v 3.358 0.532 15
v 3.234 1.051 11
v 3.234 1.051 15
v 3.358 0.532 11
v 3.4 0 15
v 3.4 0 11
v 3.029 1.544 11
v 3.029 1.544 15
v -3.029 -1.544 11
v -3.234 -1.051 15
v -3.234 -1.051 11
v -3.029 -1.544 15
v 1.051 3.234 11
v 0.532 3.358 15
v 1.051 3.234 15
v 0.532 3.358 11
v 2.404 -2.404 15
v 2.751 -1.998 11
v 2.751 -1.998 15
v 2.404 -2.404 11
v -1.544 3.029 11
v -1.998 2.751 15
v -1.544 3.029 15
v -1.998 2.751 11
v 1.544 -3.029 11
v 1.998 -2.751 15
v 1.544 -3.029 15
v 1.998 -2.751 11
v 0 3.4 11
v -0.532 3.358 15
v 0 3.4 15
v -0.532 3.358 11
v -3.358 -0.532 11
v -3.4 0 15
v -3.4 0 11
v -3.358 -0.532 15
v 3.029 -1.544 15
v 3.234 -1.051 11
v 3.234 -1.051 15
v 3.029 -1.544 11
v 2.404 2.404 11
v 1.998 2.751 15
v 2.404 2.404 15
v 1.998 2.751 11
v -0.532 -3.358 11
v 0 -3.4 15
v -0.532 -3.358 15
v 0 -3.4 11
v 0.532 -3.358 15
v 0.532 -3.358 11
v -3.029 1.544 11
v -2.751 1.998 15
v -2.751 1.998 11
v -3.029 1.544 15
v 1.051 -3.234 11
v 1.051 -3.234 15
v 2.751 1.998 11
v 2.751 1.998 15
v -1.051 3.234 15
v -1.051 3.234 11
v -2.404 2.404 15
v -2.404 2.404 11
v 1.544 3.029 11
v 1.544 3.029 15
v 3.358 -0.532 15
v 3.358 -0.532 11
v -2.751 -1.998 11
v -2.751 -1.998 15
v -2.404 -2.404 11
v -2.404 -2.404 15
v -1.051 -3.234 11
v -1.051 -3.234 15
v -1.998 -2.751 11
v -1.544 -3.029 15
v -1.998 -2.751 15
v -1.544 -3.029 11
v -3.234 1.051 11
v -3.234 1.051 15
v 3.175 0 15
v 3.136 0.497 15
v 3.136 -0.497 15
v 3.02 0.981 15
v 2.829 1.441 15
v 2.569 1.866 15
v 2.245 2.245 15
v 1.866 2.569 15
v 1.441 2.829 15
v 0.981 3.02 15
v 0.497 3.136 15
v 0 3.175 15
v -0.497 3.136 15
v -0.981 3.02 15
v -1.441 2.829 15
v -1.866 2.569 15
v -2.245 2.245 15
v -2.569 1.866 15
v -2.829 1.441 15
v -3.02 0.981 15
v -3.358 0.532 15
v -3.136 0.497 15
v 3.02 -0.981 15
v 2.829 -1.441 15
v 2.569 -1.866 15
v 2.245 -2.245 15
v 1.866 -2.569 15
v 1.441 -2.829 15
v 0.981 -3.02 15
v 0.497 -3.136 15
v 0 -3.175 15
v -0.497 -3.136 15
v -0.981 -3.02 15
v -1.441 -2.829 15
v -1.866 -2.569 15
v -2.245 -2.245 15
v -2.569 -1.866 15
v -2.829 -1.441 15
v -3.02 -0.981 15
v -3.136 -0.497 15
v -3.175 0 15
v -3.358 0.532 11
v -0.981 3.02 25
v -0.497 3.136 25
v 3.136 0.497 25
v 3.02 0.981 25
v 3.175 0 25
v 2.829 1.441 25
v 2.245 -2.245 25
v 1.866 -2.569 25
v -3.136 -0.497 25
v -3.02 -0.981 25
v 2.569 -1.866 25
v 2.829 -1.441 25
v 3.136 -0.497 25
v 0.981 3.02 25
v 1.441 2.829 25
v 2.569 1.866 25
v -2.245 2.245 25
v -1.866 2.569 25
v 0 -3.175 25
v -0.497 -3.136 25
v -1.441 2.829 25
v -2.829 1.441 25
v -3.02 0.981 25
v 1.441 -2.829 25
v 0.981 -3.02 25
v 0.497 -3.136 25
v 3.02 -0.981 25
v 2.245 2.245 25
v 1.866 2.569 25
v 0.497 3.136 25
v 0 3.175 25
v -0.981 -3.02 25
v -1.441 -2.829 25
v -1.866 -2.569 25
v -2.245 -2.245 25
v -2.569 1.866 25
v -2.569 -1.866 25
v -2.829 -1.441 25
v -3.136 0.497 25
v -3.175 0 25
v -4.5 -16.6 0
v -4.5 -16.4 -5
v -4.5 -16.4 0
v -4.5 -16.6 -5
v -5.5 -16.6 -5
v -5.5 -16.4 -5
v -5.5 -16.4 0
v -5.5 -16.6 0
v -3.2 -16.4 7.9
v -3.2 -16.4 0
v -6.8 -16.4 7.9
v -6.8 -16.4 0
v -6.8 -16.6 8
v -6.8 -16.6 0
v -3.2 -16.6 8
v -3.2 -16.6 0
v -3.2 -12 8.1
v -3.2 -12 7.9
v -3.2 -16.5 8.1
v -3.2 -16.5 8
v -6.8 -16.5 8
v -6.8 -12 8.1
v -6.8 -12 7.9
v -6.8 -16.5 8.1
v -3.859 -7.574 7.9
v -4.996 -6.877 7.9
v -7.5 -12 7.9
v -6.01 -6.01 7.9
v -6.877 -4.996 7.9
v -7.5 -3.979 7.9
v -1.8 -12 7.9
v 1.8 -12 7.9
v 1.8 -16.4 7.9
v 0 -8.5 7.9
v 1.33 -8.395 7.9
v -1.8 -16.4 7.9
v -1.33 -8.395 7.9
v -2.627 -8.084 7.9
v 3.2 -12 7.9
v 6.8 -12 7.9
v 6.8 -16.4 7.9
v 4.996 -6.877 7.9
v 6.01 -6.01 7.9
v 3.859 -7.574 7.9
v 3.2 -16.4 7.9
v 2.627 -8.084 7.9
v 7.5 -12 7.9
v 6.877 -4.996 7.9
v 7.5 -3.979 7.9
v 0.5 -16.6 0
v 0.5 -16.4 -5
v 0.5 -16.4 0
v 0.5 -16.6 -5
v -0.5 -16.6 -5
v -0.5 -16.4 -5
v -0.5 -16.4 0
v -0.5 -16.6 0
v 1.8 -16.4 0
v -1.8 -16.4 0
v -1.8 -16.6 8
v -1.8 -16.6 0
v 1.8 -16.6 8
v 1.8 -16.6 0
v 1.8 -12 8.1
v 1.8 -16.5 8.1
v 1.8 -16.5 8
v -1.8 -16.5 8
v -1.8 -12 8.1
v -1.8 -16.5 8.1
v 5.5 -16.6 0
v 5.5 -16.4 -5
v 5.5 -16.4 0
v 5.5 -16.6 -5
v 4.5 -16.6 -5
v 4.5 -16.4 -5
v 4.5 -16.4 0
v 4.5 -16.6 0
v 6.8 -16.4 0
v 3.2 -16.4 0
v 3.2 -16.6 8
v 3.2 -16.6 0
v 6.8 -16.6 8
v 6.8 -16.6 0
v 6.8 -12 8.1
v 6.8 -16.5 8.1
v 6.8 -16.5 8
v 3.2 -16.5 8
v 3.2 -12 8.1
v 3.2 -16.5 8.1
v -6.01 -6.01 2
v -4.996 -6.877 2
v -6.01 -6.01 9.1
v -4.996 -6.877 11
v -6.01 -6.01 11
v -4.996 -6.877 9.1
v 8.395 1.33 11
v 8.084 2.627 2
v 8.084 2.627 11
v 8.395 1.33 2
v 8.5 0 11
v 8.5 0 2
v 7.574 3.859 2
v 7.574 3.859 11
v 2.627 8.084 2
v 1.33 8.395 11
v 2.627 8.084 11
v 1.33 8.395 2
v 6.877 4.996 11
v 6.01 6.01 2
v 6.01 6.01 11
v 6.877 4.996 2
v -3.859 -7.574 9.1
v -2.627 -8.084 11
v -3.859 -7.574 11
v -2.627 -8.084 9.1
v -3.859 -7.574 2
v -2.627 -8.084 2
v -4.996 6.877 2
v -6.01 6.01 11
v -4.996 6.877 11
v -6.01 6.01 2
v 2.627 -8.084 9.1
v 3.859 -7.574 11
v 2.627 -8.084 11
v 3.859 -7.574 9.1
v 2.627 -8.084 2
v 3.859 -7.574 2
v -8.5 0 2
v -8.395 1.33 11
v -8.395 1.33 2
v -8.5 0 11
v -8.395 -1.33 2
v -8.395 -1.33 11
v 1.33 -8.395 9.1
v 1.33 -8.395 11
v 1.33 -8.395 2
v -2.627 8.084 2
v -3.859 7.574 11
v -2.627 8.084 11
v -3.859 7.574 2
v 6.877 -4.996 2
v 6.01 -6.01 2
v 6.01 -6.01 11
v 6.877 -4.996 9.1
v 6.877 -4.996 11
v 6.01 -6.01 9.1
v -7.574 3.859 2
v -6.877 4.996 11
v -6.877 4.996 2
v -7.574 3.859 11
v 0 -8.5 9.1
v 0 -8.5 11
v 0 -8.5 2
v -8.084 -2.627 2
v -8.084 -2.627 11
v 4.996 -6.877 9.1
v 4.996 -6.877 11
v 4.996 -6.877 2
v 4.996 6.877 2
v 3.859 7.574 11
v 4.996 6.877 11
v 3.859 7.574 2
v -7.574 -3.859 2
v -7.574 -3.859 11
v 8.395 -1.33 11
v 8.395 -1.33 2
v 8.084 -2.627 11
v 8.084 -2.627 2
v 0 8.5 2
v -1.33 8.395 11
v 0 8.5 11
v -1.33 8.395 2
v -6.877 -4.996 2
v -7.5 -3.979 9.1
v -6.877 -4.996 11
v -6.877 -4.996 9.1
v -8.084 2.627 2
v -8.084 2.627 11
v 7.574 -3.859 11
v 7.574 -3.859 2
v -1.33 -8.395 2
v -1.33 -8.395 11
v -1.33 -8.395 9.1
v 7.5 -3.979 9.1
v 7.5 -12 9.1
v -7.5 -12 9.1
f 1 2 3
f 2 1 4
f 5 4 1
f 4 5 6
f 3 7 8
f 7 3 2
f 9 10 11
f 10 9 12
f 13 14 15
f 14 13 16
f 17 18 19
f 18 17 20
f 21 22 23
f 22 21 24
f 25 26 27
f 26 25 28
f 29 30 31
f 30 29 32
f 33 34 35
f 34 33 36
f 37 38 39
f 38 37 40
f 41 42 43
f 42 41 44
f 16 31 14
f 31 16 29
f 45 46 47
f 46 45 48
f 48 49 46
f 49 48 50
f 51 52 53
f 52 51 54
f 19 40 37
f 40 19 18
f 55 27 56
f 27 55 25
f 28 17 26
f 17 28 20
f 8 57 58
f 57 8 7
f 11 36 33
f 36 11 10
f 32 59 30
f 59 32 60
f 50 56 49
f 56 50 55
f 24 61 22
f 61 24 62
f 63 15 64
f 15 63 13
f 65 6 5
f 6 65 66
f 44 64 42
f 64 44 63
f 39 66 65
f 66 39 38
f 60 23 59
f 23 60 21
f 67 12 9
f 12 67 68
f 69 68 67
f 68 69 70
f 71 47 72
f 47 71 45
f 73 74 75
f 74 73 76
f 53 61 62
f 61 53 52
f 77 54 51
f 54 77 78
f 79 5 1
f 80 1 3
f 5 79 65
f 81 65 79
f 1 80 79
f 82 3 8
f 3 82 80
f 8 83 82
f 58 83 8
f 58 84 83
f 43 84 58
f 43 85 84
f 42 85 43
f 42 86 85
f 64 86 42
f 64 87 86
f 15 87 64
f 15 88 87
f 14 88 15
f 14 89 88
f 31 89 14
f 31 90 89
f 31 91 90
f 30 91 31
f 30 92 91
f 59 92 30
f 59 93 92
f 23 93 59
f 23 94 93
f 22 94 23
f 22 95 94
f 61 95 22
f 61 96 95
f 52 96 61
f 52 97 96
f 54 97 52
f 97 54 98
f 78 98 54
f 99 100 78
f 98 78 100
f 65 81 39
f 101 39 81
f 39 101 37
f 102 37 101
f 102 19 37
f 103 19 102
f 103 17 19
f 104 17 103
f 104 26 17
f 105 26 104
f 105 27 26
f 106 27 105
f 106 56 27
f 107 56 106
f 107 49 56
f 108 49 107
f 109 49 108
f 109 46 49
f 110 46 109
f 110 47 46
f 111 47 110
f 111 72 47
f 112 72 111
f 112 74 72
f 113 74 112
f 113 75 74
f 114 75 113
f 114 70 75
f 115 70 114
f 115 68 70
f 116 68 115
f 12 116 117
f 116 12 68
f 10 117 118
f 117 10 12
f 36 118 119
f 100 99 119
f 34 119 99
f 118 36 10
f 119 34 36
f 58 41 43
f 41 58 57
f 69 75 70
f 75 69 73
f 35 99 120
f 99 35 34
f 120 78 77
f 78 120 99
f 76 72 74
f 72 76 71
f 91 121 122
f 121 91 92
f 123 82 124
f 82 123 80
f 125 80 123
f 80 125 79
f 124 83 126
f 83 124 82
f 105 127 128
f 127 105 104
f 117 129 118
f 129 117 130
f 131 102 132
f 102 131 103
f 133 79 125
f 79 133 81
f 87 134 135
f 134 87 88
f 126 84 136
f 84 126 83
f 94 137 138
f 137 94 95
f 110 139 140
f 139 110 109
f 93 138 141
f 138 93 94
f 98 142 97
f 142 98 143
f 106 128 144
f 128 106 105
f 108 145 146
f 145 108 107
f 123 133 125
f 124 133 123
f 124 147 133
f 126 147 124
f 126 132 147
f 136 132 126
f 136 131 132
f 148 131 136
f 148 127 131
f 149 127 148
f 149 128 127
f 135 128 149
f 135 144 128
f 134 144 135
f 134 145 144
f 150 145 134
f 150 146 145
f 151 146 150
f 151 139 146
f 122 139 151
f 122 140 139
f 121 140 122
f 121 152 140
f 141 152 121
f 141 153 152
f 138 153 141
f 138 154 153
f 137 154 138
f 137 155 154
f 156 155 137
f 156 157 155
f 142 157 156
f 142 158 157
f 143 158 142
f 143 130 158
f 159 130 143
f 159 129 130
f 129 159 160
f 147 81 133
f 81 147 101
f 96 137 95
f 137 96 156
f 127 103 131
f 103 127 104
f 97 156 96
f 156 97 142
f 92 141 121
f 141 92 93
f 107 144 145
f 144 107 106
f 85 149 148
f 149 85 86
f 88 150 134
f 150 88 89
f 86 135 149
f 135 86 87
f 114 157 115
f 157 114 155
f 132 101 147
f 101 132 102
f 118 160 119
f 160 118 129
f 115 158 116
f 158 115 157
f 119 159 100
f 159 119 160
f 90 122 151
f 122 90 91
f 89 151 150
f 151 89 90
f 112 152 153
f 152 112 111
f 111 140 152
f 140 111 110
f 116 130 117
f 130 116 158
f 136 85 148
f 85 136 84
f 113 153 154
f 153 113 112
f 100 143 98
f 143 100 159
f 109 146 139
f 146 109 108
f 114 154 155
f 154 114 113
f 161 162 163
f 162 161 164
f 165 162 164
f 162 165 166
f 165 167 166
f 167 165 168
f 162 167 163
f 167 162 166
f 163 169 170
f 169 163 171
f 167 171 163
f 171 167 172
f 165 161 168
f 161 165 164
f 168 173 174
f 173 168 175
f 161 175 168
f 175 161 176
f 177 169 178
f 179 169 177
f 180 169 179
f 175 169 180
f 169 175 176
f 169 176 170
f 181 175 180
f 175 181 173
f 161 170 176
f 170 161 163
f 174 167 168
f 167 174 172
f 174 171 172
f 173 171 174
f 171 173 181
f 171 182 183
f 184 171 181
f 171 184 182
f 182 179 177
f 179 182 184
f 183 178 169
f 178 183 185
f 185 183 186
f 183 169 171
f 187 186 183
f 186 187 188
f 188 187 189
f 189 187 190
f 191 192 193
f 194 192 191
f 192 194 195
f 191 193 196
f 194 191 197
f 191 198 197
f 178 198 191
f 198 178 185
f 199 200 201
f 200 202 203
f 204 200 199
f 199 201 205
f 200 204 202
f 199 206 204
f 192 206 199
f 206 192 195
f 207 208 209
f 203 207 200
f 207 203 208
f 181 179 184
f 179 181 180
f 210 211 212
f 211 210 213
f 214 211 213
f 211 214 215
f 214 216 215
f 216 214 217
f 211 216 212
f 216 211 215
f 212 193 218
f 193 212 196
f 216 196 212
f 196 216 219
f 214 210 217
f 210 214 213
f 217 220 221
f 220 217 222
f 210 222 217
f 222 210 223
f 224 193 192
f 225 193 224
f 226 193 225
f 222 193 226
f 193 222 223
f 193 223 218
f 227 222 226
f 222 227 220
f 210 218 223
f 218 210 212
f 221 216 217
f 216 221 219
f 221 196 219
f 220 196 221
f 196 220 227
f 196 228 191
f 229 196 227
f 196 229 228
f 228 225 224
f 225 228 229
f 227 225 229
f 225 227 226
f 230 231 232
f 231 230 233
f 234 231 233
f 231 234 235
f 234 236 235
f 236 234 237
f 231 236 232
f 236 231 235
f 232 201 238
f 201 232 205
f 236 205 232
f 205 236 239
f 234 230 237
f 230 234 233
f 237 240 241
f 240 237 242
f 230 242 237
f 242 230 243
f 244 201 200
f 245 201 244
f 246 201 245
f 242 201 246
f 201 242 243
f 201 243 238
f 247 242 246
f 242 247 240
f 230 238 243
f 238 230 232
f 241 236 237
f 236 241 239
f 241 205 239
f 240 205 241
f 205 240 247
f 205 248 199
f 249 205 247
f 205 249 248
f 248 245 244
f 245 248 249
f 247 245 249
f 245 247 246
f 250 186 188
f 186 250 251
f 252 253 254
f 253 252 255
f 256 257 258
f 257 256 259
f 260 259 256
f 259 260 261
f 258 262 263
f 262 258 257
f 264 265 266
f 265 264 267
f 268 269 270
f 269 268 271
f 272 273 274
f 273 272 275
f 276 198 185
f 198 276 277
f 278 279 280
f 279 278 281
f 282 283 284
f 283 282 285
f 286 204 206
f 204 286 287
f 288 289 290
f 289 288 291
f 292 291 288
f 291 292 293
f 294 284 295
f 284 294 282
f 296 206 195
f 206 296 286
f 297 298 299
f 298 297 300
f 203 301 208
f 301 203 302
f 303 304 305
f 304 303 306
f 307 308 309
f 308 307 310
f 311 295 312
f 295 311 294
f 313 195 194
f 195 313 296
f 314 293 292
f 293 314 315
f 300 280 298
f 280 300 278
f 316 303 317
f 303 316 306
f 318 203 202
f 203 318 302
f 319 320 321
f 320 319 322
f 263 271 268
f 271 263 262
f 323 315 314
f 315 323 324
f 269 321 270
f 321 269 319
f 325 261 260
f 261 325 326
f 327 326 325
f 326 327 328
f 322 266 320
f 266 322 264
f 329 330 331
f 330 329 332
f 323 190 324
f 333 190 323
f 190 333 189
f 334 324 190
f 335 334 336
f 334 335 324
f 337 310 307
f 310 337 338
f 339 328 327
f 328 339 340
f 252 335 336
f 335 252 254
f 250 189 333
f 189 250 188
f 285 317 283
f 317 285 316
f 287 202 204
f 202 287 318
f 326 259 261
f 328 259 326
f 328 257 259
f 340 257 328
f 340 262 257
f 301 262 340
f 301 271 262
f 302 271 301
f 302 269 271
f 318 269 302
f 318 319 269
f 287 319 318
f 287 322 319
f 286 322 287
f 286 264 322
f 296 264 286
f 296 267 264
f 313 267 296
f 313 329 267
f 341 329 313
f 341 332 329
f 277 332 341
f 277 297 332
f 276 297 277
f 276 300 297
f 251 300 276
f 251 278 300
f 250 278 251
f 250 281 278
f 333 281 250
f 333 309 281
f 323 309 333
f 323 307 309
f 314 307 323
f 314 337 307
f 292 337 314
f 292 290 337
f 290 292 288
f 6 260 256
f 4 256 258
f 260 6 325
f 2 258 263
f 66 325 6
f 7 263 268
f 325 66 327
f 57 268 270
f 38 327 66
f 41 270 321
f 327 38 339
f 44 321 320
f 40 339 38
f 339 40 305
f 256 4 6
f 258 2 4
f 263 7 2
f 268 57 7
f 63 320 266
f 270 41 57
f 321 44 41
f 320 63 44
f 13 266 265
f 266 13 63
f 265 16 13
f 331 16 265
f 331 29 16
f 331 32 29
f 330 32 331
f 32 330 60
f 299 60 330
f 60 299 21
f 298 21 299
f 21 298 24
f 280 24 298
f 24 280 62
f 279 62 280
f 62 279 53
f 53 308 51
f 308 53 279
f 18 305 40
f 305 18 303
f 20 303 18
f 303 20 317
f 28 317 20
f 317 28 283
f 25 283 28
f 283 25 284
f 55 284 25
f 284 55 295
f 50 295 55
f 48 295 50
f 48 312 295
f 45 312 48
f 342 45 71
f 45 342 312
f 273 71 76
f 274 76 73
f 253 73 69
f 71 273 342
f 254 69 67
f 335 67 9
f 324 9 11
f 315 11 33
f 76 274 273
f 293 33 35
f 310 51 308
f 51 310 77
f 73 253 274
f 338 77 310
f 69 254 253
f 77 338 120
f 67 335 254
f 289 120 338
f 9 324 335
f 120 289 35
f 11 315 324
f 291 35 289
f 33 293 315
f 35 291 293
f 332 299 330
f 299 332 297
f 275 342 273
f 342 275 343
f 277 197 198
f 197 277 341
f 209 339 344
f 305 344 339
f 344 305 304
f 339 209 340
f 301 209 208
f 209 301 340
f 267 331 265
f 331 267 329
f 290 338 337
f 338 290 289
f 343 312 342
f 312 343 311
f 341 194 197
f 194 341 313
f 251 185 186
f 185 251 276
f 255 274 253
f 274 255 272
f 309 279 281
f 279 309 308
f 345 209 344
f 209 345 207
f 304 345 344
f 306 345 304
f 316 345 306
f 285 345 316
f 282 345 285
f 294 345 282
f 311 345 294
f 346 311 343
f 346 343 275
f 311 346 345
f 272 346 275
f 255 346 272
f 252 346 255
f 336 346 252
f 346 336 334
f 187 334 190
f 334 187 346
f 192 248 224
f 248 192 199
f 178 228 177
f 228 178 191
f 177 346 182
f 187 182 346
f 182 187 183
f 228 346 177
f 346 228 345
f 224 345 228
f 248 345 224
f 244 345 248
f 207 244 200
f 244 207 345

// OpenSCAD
$fn=40;

red = [0.8,0.2,0.2];
green = [0.2,0.8,0.2];
brown = [0.8,0.5,0.2];
black = [0.2,0.2,0.2];
silver = [0.75,0.75,0.75];
epsilon = 0.001;

// FreeCad doesn't like the prettier model
// that rounds things with that minkowski
module body()
{
    translate([0,0,2])
//	minkowski() {
//	    cylinder(h=7, d=15);
//	    sphere(d=2);
//	}
	cylinder(h=9, d=17);
}

module shaft()
{
    translate([0,0,10])
	cylinder(5, d=6.8);
    translate([0,0,15])
	cylinder(10, d=6.35);
}

module pcb()
{
    translate([0, -6, 8.5])
	cube([15,12,1.2],center=true);
}

module leg(pos)
{
    translate([pos, -16.5, 0]) {
	cube([1, 0.2, 10], center=true);
	translate([0, 0, 4]) cube([3.6, 0.2, 8], center=true);
	translate([0, 6, 8]) cube([3.6, 12, 0.2], center=true);
    }
}

module pot_basic()
{
    color(silver) body();
    color(silver) shaft();
    color(brown) pcb();
    color(silver) {
	leg(-5); leg(0); leg(5);
    }
}

pot_basic();
